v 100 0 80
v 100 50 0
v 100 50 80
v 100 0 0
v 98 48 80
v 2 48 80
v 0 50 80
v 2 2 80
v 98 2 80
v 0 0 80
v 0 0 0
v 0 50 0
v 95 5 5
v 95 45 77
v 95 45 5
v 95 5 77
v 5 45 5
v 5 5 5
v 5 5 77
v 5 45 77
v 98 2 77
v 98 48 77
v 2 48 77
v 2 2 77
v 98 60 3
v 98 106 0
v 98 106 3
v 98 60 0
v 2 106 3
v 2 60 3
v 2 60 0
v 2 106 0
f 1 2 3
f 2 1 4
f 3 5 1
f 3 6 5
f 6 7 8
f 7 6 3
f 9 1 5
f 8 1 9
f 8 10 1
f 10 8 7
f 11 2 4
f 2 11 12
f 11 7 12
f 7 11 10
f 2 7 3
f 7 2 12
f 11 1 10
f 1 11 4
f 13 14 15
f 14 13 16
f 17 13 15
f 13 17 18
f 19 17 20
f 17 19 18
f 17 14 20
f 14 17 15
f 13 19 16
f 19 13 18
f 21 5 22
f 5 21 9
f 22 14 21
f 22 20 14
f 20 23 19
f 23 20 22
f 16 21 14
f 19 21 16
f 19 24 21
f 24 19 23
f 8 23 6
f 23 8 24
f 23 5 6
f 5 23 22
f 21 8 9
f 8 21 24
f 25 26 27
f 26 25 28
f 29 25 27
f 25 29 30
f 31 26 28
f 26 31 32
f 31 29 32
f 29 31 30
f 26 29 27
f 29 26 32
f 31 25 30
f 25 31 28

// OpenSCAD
WideY=50;
LengthX=100;
HightZ=80;
Wall=5;
DW=Wall*2;
LidZ=3;
Brim=2;
DB=Brim*2;

difference()
{
  cube([LengthX,WideY,HightZ]);
  translate([Wall,Wall,Wall]) cube([LengthX-DW,WideY-DW,HightZ]);
  translate([Brim,Brim,HightZ-LidZ]) cube([LengthX-DB,WideY-DB,LidZ+1]);
}

translate([Brim,WideY+DW,0]) cube([LengthX-DB,WideY-DB,LidZ]);
